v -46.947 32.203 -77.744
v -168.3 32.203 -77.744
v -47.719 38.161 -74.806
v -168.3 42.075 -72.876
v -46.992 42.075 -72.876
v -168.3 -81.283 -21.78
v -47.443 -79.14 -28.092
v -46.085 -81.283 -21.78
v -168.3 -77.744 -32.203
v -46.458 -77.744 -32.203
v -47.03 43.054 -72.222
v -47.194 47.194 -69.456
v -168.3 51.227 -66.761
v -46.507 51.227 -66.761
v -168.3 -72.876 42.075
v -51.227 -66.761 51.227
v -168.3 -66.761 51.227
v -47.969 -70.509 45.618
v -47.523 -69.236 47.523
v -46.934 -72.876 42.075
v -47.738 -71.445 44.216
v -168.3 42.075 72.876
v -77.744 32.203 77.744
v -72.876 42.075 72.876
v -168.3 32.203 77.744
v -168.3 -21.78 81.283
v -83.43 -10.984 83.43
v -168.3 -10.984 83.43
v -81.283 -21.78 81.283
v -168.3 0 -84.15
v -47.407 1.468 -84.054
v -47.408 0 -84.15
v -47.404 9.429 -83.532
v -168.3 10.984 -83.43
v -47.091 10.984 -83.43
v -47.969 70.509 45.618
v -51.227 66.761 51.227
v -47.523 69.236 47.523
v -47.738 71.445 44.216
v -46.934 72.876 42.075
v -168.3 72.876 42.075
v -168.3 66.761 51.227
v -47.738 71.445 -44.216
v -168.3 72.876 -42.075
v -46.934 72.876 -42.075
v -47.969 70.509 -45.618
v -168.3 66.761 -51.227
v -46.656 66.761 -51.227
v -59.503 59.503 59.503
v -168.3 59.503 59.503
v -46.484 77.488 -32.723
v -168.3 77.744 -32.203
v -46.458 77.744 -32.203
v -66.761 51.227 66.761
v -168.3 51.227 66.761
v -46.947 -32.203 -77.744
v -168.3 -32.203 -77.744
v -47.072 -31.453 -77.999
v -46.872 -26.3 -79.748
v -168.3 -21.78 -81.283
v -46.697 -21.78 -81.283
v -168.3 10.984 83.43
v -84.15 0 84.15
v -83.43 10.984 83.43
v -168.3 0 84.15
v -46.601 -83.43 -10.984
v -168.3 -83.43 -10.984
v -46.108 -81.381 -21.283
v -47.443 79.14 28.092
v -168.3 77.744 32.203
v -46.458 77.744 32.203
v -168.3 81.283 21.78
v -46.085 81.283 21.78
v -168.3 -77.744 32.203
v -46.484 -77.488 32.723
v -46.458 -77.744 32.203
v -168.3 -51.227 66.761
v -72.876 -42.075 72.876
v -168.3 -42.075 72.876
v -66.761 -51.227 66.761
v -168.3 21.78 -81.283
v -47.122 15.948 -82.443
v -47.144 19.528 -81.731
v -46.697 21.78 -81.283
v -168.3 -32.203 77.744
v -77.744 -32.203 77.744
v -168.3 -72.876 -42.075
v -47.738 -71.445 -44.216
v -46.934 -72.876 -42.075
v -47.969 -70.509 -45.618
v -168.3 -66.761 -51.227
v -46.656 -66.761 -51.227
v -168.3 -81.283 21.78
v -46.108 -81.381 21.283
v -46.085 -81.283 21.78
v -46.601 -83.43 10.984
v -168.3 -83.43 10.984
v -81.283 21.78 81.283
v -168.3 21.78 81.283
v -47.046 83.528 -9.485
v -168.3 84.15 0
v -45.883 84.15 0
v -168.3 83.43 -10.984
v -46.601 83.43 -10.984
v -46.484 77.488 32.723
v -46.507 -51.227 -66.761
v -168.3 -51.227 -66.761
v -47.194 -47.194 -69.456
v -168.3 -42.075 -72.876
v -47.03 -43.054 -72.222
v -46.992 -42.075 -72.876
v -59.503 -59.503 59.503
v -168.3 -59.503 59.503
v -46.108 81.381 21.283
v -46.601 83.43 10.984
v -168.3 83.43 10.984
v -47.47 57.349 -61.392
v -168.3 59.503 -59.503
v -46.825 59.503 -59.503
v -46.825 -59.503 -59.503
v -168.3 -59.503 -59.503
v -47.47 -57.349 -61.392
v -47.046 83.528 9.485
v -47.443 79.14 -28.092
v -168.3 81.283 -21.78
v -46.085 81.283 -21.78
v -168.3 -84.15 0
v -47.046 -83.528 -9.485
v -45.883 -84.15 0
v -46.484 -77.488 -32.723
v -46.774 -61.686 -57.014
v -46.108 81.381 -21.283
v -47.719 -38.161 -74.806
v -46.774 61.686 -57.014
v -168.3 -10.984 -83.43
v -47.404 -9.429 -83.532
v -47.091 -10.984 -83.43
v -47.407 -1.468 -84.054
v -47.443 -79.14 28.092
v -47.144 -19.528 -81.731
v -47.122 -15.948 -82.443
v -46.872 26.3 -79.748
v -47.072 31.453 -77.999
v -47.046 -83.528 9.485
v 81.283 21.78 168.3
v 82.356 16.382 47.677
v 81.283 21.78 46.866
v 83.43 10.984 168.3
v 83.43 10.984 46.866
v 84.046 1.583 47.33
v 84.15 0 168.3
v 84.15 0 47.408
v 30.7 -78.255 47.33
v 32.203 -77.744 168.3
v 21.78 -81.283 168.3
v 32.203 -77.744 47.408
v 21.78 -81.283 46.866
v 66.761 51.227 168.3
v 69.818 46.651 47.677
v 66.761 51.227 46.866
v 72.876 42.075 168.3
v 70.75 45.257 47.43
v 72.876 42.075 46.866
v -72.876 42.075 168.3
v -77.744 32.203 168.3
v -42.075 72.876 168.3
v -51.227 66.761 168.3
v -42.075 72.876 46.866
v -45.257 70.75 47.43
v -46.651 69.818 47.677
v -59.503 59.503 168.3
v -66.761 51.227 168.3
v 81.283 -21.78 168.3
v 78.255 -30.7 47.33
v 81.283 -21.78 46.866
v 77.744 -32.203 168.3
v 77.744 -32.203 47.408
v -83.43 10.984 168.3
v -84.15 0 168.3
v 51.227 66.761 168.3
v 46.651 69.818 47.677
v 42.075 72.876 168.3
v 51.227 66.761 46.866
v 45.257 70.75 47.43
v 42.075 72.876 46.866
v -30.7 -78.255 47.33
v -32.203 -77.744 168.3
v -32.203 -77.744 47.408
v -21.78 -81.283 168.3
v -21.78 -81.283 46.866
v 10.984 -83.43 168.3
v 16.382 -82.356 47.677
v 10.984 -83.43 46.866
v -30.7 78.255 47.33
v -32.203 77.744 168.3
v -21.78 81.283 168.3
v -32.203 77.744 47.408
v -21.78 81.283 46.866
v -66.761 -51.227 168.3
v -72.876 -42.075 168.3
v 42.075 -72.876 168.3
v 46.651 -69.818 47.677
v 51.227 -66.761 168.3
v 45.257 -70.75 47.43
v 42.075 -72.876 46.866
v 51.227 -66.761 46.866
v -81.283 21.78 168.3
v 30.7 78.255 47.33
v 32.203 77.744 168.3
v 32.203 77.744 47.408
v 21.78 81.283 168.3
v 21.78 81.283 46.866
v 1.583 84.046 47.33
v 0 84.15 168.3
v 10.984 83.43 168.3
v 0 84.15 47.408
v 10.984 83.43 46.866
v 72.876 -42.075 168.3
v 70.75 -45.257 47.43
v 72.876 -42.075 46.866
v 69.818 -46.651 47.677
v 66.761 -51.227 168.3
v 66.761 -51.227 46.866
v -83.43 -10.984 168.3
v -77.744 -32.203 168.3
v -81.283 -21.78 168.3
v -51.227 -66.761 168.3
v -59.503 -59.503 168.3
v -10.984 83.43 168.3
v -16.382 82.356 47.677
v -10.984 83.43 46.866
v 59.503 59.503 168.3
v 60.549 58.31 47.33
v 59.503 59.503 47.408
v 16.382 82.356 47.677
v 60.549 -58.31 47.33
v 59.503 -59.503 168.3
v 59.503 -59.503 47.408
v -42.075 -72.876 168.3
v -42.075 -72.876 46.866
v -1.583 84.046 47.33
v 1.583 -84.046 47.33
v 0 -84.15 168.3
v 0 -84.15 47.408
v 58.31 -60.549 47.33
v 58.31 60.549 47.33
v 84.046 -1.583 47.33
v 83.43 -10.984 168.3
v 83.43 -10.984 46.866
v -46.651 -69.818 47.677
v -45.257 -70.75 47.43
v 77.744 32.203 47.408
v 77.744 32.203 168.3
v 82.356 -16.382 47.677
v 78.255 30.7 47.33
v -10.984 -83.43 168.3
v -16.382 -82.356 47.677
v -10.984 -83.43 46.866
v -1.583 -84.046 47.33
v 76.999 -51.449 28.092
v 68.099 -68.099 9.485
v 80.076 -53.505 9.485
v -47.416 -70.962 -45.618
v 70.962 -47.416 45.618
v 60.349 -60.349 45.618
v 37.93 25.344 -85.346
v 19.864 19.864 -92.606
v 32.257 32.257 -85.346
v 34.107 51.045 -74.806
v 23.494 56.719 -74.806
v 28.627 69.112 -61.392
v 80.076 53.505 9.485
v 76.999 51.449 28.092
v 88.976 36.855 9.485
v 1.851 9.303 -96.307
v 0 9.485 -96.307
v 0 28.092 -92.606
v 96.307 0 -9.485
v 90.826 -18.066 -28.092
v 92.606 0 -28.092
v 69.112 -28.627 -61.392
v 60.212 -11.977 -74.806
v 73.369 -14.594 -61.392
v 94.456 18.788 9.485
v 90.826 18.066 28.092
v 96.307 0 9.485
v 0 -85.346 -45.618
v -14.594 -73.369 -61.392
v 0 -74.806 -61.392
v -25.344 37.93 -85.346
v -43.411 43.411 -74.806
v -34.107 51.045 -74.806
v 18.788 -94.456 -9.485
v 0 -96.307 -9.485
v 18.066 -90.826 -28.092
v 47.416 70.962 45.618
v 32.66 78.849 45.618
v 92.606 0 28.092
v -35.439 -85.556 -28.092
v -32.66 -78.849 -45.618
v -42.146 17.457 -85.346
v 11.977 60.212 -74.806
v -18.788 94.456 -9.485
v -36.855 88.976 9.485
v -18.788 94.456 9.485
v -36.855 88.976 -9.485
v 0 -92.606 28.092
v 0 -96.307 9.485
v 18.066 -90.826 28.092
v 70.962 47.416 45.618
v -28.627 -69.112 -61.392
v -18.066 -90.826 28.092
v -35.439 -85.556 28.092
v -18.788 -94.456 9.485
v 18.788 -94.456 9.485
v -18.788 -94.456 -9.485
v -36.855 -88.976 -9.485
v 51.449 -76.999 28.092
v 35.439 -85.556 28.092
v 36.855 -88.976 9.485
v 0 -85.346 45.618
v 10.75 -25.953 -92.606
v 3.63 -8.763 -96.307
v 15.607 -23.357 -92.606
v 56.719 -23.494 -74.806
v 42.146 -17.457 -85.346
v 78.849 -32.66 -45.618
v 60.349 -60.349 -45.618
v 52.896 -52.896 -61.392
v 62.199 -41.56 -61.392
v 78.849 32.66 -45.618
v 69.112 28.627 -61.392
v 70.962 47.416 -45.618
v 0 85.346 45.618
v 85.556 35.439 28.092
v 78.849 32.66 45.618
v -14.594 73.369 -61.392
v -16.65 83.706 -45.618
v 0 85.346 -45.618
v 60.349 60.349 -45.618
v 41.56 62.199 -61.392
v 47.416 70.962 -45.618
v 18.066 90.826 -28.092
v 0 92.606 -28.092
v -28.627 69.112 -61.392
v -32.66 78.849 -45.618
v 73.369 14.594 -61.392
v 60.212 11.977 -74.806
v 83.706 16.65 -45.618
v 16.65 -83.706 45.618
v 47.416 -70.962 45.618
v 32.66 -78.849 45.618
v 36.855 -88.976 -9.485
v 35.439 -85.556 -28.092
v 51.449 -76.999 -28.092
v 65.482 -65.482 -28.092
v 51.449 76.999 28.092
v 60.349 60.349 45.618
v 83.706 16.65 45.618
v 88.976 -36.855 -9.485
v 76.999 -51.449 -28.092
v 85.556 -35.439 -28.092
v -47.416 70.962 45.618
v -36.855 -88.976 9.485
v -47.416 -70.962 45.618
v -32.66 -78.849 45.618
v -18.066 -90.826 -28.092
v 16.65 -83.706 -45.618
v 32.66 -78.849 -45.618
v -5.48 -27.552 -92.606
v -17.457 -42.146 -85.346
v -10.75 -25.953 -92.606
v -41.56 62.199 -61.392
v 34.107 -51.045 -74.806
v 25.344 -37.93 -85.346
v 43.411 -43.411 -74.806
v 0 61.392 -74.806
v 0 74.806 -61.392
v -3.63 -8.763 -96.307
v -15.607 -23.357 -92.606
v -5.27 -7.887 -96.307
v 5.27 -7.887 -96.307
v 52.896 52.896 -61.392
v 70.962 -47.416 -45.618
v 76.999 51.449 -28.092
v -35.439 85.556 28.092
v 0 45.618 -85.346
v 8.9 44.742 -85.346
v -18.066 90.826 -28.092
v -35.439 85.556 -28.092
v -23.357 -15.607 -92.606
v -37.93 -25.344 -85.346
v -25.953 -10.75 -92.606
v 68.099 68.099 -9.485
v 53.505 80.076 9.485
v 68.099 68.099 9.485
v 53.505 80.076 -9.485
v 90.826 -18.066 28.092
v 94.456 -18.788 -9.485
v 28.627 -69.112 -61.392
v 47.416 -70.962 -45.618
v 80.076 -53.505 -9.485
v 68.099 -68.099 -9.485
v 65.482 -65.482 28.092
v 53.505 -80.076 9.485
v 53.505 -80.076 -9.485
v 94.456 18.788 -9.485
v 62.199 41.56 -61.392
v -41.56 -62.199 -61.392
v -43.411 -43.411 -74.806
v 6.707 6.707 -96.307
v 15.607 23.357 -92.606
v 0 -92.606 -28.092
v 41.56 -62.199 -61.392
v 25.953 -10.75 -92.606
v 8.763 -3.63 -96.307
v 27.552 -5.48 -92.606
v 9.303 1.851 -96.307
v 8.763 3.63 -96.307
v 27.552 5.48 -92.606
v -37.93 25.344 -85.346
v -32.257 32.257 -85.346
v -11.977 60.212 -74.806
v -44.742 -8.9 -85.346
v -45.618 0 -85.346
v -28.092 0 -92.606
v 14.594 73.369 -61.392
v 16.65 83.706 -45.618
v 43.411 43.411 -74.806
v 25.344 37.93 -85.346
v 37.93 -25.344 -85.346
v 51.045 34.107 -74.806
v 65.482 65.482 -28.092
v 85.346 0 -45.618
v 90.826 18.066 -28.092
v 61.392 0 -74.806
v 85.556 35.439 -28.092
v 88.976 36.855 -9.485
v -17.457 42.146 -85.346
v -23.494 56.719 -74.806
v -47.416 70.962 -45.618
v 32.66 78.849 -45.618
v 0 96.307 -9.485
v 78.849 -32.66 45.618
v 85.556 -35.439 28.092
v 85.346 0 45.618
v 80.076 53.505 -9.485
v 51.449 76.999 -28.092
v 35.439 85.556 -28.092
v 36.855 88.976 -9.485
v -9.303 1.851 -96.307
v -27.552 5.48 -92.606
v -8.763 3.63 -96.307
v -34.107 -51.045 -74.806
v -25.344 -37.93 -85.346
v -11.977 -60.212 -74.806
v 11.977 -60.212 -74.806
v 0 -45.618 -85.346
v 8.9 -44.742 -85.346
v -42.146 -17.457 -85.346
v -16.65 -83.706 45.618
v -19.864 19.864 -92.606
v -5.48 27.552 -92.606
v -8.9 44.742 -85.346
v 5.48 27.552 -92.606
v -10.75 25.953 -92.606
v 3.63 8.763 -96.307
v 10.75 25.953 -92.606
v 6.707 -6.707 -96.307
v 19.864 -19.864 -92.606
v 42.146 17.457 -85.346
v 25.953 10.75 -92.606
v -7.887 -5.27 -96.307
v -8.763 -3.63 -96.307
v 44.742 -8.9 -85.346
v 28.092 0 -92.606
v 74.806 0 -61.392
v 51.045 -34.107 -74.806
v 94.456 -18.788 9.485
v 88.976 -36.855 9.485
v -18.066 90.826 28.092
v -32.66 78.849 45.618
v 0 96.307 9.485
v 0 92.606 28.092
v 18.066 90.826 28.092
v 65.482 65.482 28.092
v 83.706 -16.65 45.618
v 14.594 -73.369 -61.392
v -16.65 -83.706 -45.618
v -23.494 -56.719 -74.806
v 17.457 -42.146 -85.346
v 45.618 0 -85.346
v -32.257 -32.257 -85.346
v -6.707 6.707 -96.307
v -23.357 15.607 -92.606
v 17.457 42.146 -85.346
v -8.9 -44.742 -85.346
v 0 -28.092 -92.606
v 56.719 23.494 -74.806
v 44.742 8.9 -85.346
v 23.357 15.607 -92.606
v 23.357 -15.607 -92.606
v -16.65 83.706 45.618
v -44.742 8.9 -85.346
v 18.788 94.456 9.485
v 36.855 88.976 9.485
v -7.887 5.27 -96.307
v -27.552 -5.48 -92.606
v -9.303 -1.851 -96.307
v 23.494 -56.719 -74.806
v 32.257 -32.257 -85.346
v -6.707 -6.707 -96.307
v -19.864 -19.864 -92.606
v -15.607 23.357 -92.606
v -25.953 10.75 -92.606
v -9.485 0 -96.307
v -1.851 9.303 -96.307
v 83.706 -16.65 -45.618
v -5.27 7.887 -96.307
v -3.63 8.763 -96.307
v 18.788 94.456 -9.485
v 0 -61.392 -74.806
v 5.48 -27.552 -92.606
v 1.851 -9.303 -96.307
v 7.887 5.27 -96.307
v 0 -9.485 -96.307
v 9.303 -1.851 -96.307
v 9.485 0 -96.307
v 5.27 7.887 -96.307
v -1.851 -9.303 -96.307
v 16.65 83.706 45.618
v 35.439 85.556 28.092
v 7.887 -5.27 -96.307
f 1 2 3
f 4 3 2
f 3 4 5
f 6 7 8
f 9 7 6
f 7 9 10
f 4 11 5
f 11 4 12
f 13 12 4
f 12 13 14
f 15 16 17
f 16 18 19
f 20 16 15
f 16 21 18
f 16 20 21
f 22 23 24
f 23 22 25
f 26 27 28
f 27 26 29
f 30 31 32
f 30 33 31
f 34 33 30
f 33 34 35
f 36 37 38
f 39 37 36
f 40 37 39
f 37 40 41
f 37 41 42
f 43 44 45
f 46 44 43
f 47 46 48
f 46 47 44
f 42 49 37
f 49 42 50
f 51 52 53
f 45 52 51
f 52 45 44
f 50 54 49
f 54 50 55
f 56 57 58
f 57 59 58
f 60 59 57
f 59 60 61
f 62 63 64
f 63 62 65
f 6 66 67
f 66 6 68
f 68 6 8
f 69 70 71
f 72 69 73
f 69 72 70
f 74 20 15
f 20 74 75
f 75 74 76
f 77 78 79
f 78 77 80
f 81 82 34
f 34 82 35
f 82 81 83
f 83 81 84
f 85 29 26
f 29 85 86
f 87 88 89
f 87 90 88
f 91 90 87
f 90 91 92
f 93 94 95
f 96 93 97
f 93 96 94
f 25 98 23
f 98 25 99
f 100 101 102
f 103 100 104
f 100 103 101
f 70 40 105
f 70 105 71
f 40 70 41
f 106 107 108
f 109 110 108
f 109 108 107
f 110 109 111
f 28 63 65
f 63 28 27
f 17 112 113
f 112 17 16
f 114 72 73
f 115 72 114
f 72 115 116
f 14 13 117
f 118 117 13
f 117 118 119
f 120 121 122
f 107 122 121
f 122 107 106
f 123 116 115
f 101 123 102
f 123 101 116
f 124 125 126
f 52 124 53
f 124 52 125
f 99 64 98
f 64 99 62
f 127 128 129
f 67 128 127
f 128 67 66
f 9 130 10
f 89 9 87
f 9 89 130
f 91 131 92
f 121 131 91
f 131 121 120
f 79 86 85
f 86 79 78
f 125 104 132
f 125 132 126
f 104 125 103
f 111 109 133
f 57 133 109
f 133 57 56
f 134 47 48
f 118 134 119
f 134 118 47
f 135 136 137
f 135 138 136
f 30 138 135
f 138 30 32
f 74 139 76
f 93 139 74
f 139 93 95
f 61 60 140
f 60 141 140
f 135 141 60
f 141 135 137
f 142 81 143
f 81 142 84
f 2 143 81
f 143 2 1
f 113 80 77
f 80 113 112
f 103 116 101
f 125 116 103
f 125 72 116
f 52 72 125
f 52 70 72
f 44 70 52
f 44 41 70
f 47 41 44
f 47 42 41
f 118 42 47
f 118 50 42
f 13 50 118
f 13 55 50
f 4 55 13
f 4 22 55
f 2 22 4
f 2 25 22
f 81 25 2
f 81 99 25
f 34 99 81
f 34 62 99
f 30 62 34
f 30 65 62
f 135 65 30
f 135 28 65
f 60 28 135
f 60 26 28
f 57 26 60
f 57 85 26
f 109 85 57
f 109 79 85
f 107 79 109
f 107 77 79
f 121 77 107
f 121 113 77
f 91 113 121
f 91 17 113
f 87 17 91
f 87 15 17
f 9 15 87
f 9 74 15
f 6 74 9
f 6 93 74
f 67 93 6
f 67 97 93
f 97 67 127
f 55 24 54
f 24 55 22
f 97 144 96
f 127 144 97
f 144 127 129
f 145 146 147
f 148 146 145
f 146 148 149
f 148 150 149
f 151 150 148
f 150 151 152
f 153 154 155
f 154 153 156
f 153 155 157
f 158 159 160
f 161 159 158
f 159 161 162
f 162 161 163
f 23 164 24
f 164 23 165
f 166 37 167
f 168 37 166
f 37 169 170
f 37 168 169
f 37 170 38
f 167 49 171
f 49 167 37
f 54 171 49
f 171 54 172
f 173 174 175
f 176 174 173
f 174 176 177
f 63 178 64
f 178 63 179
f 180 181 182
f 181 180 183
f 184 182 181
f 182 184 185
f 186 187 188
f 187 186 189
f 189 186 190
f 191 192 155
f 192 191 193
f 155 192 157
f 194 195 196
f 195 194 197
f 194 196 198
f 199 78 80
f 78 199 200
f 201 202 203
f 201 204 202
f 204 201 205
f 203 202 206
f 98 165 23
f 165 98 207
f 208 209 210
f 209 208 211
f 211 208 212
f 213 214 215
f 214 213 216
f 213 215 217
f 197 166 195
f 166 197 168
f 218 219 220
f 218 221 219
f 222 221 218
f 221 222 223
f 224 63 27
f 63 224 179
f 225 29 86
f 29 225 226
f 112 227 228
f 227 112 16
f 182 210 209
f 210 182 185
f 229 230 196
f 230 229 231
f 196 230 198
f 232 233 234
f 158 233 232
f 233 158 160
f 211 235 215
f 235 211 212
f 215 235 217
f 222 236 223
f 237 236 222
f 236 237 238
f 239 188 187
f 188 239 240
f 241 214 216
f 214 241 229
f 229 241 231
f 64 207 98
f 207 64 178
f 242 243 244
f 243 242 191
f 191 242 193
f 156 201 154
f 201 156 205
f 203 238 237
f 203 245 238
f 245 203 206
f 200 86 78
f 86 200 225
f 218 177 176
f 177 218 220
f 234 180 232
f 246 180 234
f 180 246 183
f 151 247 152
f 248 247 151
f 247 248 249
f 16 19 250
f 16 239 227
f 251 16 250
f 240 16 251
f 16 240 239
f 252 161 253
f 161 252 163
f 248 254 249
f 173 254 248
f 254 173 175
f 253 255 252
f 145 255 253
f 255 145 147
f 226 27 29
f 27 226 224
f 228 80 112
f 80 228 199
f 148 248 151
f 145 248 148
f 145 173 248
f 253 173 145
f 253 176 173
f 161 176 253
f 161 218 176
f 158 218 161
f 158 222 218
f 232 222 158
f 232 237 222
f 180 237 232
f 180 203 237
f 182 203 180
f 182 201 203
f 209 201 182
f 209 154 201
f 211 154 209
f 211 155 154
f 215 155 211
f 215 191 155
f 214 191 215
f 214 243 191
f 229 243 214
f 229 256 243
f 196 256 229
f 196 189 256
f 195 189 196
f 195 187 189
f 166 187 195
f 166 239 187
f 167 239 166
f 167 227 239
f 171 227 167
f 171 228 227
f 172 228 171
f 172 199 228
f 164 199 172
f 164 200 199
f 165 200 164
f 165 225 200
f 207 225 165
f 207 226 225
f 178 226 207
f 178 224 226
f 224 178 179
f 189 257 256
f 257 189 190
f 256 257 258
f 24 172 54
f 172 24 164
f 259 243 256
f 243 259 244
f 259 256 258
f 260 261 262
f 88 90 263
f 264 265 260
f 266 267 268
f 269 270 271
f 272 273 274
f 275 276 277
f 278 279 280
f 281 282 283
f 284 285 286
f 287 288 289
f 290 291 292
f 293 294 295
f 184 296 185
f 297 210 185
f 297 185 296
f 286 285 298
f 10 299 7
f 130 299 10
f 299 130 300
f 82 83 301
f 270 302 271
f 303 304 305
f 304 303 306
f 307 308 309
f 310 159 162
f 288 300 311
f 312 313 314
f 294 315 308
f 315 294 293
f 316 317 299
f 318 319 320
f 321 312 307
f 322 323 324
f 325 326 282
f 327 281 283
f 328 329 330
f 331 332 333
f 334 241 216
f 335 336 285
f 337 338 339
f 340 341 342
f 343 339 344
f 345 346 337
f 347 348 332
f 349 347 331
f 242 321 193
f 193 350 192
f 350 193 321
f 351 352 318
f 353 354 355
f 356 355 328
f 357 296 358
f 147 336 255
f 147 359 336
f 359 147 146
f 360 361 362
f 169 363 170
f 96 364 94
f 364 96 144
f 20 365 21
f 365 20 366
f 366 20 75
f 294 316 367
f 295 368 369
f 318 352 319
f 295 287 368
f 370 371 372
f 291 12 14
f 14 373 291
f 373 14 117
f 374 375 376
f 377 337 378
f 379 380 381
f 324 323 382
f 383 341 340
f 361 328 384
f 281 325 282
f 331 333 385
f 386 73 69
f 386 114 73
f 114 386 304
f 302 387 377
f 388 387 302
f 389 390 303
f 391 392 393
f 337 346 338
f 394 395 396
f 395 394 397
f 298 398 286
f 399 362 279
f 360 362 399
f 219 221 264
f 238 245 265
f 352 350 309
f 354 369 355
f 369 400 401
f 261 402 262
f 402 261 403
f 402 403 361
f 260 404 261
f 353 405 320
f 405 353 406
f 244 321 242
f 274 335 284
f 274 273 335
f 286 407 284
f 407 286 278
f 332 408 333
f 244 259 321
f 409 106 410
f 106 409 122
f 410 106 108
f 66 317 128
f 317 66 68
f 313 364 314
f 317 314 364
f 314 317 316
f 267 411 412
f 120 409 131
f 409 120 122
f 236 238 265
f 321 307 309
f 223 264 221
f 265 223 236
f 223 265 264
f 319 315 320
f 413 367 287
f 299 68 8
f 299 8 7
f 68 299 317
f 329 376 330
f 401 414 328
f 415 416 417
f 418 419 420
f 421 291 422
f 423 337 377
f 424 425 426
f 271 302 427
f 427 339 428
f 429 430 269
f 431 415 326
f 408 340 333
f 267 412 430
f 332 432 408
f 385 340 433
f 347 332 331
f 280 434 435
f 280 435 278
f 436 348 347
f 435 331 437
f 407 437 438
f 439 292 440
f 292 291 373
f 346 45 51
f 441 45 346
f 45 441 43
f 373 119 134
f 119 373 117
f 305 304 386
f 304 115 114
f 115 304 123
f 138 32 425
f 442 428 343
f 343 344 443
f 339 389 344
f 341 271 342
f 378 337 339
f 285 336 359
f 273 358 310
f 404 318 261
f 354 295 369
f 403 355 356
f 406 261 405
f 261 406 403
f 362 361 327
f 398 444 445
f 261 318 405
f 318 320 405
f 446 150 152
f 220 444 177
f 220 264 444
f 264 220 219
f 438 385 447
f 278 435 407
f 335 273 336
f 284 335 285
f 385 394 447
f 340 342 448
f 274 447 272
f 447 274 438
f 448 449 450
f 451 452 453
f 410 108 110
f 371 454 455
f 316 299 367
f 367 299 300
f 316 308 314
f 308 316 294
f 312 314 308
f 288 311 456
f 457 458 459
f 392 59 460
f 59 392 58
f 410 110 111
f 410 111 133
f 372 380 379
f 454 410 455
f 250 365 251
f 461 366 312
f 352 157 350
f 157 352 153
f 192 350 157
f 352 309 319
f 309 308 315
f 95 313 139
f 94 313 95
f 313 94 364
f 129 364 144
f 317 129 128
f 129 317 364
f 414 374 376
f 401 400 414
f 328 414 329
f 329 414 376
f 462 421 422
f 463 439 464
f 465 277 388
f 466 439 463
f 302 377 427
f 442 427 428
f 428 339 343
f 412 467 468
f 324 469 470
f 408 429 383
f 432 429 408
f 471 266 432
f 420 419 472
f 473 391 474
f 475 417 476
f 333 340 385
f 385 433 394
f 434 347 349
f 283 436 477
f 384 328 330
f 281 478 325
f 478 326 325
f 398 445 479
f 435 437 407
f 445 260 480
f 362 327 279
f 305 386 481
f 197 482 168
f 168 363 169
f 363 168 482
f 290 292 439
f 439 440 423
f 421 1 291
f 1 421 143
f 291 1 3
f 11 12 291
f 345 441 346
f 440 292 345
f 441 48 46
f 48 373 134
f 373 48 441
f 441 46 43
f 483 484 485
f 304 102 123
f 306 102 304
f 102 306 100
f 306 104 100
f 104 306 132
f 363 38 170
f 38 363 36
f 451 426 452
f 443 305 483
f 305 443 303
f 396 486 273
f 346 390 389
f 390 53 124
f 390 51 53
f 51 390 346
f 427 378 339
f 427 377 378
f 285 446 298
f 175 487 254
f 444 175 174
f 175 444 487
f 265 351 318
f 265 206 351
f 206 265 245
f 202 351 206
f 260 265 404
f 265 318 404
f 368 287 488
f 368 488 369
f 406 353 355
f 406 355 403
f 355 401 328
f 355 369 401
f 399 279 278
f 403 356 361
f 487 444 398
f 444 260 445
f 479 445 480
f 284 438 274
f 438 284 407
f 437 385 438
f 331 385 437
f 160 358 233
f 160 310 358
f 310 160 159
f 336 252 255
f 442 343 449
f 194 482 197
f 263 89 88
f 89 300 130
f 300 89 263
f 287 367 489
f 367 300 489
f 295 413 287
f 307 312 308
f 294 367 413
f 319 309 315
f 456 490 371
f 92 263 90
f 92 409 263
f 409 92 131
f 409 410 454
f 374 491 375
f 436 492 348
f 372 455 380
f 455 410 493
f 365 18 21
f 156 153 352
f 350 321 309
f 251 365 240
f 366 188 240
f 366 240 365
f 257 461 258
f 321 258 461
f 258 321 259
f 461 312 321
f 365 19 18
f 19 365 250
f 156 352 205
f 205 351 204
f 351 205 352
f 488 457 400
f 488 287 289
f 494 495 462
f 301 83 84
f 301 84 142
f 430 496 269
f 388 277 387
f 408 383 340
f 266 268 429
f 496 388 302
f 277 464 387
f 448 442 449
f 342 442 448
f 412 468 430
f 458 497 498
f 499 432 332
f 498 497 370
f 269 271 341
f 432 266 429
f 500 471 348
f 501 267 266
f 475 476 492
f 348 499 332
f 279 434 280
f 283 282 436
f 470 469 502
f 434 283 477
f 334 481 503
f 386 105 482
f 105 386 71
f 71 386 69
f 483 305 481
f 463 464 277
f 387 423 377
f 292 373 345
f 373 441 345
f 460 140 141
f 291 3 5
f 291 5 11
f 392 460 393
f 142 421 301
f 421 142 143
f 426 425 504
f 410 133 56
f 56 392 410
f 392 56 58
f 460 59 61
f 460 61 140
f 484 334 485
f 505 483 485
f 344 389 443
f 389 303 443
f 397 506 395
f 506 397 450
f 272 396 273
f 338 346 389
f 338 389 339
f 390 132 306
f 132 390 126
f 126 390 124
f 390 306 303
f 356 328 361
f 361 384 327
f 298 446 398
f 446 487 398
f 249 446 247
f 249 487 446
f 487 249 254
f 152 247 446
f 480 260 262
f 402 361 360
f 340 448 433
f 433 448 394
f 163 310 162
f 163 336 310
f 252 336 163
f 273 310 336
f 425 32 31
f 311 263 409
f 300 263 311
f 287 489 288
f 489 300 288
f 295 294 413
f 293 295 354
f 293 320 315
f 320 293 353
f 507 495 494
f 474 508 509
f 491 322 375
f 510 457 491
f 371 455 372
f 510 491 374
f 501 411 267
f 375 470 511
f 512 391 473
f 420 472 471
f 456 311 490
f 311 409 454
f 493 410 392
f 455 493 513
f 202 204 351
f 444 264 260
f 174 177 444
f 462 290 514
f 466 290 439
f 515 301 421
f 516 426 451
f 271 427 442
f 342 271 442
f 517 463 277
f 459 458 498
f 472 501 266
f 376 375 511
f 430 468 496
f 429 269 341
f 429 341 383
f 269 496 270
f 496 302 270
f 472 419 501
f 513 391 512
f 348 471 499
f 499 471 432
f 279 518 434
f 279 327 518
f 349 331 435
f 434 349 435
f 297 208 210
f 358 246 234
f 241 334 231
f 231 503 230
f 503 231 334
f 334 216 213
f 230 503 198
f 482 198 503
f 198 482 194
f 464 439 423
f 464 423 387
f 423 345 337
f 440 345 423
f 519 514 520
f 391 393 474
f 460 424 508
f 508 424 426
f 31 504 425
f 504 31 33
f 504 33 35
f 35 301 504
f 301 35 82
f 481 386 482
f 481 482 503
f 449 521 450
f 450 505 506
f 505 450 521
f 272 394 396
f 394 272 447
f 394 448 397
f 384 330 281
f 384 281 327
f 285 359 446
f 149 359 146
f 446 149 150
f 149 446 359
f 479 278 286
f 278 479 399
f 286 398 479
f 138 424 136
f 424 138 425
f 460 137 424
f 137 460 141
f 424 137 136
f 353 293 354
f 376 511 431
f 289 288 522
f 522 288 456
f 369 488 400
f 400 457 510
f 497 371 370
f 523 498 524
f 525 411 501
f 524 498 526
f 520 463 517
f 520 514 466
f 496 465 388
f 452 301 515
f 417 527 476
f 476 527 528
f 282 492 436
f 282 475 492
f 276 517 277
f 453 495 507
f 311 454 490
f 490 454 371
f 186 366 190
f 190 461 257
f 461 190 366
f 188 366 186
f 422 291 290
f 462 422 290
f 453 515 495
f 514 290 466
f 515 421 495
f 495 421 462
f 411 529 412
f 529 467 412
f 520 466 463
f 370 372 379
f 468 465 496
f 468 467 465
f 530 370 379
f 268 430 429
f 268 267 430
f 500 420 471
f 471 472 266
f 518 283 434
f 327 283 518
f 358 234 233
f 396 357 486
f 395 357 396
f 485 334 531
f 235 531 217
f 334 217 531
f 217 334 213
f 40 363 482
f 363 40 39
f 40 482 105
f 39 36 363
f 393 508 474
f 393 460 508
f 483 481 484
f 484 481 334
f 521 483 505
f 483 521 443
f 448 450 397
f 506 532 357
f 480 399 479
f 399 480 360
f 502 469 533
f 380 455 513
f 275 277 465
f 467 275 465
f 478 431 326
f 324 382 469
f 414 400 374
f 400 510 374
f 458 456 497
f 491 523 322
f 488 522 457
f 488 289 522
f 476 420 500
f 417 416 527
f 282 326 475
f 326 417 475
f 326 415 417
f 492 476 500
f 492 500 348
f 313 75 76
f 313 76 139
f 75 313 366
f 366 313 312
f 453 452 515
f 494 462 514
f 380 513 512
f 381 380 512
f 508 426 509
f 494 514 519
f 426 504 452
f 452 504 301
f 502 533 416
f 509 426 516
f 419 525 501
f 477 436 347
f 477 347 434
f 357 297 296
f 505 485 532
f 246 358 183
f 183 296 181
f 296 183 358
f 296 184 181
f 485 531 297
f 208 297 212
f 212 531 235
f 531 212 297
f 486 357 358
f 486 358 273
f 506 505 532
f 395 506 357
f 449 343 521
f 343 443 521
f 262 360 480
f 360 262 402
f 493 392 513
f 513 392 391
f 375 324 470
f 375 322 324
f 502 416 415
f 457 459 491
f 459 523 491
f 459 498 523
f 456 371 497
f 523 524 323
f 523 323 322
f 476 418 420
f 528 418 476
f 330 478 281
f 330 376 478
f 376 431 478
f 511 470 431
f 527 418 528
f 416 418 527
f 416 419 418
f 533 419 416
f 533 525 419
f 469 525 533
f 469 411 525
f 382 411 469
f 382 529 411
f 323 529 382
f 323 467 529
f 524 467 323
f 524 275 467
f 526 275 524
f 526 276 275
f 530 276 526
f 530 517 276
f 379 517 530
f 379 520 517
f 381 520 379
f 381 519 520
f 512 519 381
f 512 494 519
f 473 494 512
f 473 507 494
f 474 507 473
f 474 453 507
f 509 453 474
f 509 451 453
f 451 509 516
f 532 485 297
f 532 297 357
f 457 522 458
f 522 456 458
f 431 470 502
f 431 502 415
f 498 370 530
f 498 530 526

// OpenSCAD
// Auto-generated by scripts/author_from_manifest.py (Phase D.3).
// Source: data/phase_d_manifest.json (sku_intent='victaulic-no10-elbow-90-grooved-6in').
// Do not hand-edit — regenerate from the manifest.
//
// @part victaulic_no10_elbow_90_grooved_6in
// @kind fitting
// @category fitting.elbow
// @display-name "Victaulic No. 10 90° Grooved Elbow 6\""
// @mfg victaulic
// @mfg-pn No._10_6in
// @listing UL FM
// @price-usd 62.00
// @install-minutes 6
// @crew journeyman
// @param size_in number default=6 label="Size" unit="in"
// @port in position=[-0.05,0,0] direction=[-1,0,0] style=grooved size_in=6 role=run_a
// @port out position=[0,0,0.05] direction=[0,0,1] style=grooved size_in=6 role=run_b

size_in = 6.0;

function od_mm(nps) =
    nps ==   1  ? 33.4 :
    nps == 1.25 ? 42.2 :
    nps == 1.5  ? 48.3 :
    nps ==   2  ? 60.3 :
    nps == 2.5  ? 73.0 :
    nps ==   3  ? 88.9 :
    nps ==   4  ? 114.3 :
    nps ==   5  ? 141.3 :
    nps ==   6  ? 168.3 :
    nps ==   8  ? 219.1 :
    nps ==  10  ? 273.0 : 60.3;

od = od_mm(size_in);
leg = od * 1.0;

union() {
    // Inlet leg along -X
    translate([-leg/2, 0, 0])
        rotate([0, 90, 0])
        cylinder(h = leg, d = od, center = true, $fn = 48);
    // Outlet leg along +Z
    translate([0, 0, leg/2])
        cylinder(h = leg, d = od, center = true, $fn = 48);
    // Knuckle
    sphere(d = od * 1.15, $fn = 32);
}
